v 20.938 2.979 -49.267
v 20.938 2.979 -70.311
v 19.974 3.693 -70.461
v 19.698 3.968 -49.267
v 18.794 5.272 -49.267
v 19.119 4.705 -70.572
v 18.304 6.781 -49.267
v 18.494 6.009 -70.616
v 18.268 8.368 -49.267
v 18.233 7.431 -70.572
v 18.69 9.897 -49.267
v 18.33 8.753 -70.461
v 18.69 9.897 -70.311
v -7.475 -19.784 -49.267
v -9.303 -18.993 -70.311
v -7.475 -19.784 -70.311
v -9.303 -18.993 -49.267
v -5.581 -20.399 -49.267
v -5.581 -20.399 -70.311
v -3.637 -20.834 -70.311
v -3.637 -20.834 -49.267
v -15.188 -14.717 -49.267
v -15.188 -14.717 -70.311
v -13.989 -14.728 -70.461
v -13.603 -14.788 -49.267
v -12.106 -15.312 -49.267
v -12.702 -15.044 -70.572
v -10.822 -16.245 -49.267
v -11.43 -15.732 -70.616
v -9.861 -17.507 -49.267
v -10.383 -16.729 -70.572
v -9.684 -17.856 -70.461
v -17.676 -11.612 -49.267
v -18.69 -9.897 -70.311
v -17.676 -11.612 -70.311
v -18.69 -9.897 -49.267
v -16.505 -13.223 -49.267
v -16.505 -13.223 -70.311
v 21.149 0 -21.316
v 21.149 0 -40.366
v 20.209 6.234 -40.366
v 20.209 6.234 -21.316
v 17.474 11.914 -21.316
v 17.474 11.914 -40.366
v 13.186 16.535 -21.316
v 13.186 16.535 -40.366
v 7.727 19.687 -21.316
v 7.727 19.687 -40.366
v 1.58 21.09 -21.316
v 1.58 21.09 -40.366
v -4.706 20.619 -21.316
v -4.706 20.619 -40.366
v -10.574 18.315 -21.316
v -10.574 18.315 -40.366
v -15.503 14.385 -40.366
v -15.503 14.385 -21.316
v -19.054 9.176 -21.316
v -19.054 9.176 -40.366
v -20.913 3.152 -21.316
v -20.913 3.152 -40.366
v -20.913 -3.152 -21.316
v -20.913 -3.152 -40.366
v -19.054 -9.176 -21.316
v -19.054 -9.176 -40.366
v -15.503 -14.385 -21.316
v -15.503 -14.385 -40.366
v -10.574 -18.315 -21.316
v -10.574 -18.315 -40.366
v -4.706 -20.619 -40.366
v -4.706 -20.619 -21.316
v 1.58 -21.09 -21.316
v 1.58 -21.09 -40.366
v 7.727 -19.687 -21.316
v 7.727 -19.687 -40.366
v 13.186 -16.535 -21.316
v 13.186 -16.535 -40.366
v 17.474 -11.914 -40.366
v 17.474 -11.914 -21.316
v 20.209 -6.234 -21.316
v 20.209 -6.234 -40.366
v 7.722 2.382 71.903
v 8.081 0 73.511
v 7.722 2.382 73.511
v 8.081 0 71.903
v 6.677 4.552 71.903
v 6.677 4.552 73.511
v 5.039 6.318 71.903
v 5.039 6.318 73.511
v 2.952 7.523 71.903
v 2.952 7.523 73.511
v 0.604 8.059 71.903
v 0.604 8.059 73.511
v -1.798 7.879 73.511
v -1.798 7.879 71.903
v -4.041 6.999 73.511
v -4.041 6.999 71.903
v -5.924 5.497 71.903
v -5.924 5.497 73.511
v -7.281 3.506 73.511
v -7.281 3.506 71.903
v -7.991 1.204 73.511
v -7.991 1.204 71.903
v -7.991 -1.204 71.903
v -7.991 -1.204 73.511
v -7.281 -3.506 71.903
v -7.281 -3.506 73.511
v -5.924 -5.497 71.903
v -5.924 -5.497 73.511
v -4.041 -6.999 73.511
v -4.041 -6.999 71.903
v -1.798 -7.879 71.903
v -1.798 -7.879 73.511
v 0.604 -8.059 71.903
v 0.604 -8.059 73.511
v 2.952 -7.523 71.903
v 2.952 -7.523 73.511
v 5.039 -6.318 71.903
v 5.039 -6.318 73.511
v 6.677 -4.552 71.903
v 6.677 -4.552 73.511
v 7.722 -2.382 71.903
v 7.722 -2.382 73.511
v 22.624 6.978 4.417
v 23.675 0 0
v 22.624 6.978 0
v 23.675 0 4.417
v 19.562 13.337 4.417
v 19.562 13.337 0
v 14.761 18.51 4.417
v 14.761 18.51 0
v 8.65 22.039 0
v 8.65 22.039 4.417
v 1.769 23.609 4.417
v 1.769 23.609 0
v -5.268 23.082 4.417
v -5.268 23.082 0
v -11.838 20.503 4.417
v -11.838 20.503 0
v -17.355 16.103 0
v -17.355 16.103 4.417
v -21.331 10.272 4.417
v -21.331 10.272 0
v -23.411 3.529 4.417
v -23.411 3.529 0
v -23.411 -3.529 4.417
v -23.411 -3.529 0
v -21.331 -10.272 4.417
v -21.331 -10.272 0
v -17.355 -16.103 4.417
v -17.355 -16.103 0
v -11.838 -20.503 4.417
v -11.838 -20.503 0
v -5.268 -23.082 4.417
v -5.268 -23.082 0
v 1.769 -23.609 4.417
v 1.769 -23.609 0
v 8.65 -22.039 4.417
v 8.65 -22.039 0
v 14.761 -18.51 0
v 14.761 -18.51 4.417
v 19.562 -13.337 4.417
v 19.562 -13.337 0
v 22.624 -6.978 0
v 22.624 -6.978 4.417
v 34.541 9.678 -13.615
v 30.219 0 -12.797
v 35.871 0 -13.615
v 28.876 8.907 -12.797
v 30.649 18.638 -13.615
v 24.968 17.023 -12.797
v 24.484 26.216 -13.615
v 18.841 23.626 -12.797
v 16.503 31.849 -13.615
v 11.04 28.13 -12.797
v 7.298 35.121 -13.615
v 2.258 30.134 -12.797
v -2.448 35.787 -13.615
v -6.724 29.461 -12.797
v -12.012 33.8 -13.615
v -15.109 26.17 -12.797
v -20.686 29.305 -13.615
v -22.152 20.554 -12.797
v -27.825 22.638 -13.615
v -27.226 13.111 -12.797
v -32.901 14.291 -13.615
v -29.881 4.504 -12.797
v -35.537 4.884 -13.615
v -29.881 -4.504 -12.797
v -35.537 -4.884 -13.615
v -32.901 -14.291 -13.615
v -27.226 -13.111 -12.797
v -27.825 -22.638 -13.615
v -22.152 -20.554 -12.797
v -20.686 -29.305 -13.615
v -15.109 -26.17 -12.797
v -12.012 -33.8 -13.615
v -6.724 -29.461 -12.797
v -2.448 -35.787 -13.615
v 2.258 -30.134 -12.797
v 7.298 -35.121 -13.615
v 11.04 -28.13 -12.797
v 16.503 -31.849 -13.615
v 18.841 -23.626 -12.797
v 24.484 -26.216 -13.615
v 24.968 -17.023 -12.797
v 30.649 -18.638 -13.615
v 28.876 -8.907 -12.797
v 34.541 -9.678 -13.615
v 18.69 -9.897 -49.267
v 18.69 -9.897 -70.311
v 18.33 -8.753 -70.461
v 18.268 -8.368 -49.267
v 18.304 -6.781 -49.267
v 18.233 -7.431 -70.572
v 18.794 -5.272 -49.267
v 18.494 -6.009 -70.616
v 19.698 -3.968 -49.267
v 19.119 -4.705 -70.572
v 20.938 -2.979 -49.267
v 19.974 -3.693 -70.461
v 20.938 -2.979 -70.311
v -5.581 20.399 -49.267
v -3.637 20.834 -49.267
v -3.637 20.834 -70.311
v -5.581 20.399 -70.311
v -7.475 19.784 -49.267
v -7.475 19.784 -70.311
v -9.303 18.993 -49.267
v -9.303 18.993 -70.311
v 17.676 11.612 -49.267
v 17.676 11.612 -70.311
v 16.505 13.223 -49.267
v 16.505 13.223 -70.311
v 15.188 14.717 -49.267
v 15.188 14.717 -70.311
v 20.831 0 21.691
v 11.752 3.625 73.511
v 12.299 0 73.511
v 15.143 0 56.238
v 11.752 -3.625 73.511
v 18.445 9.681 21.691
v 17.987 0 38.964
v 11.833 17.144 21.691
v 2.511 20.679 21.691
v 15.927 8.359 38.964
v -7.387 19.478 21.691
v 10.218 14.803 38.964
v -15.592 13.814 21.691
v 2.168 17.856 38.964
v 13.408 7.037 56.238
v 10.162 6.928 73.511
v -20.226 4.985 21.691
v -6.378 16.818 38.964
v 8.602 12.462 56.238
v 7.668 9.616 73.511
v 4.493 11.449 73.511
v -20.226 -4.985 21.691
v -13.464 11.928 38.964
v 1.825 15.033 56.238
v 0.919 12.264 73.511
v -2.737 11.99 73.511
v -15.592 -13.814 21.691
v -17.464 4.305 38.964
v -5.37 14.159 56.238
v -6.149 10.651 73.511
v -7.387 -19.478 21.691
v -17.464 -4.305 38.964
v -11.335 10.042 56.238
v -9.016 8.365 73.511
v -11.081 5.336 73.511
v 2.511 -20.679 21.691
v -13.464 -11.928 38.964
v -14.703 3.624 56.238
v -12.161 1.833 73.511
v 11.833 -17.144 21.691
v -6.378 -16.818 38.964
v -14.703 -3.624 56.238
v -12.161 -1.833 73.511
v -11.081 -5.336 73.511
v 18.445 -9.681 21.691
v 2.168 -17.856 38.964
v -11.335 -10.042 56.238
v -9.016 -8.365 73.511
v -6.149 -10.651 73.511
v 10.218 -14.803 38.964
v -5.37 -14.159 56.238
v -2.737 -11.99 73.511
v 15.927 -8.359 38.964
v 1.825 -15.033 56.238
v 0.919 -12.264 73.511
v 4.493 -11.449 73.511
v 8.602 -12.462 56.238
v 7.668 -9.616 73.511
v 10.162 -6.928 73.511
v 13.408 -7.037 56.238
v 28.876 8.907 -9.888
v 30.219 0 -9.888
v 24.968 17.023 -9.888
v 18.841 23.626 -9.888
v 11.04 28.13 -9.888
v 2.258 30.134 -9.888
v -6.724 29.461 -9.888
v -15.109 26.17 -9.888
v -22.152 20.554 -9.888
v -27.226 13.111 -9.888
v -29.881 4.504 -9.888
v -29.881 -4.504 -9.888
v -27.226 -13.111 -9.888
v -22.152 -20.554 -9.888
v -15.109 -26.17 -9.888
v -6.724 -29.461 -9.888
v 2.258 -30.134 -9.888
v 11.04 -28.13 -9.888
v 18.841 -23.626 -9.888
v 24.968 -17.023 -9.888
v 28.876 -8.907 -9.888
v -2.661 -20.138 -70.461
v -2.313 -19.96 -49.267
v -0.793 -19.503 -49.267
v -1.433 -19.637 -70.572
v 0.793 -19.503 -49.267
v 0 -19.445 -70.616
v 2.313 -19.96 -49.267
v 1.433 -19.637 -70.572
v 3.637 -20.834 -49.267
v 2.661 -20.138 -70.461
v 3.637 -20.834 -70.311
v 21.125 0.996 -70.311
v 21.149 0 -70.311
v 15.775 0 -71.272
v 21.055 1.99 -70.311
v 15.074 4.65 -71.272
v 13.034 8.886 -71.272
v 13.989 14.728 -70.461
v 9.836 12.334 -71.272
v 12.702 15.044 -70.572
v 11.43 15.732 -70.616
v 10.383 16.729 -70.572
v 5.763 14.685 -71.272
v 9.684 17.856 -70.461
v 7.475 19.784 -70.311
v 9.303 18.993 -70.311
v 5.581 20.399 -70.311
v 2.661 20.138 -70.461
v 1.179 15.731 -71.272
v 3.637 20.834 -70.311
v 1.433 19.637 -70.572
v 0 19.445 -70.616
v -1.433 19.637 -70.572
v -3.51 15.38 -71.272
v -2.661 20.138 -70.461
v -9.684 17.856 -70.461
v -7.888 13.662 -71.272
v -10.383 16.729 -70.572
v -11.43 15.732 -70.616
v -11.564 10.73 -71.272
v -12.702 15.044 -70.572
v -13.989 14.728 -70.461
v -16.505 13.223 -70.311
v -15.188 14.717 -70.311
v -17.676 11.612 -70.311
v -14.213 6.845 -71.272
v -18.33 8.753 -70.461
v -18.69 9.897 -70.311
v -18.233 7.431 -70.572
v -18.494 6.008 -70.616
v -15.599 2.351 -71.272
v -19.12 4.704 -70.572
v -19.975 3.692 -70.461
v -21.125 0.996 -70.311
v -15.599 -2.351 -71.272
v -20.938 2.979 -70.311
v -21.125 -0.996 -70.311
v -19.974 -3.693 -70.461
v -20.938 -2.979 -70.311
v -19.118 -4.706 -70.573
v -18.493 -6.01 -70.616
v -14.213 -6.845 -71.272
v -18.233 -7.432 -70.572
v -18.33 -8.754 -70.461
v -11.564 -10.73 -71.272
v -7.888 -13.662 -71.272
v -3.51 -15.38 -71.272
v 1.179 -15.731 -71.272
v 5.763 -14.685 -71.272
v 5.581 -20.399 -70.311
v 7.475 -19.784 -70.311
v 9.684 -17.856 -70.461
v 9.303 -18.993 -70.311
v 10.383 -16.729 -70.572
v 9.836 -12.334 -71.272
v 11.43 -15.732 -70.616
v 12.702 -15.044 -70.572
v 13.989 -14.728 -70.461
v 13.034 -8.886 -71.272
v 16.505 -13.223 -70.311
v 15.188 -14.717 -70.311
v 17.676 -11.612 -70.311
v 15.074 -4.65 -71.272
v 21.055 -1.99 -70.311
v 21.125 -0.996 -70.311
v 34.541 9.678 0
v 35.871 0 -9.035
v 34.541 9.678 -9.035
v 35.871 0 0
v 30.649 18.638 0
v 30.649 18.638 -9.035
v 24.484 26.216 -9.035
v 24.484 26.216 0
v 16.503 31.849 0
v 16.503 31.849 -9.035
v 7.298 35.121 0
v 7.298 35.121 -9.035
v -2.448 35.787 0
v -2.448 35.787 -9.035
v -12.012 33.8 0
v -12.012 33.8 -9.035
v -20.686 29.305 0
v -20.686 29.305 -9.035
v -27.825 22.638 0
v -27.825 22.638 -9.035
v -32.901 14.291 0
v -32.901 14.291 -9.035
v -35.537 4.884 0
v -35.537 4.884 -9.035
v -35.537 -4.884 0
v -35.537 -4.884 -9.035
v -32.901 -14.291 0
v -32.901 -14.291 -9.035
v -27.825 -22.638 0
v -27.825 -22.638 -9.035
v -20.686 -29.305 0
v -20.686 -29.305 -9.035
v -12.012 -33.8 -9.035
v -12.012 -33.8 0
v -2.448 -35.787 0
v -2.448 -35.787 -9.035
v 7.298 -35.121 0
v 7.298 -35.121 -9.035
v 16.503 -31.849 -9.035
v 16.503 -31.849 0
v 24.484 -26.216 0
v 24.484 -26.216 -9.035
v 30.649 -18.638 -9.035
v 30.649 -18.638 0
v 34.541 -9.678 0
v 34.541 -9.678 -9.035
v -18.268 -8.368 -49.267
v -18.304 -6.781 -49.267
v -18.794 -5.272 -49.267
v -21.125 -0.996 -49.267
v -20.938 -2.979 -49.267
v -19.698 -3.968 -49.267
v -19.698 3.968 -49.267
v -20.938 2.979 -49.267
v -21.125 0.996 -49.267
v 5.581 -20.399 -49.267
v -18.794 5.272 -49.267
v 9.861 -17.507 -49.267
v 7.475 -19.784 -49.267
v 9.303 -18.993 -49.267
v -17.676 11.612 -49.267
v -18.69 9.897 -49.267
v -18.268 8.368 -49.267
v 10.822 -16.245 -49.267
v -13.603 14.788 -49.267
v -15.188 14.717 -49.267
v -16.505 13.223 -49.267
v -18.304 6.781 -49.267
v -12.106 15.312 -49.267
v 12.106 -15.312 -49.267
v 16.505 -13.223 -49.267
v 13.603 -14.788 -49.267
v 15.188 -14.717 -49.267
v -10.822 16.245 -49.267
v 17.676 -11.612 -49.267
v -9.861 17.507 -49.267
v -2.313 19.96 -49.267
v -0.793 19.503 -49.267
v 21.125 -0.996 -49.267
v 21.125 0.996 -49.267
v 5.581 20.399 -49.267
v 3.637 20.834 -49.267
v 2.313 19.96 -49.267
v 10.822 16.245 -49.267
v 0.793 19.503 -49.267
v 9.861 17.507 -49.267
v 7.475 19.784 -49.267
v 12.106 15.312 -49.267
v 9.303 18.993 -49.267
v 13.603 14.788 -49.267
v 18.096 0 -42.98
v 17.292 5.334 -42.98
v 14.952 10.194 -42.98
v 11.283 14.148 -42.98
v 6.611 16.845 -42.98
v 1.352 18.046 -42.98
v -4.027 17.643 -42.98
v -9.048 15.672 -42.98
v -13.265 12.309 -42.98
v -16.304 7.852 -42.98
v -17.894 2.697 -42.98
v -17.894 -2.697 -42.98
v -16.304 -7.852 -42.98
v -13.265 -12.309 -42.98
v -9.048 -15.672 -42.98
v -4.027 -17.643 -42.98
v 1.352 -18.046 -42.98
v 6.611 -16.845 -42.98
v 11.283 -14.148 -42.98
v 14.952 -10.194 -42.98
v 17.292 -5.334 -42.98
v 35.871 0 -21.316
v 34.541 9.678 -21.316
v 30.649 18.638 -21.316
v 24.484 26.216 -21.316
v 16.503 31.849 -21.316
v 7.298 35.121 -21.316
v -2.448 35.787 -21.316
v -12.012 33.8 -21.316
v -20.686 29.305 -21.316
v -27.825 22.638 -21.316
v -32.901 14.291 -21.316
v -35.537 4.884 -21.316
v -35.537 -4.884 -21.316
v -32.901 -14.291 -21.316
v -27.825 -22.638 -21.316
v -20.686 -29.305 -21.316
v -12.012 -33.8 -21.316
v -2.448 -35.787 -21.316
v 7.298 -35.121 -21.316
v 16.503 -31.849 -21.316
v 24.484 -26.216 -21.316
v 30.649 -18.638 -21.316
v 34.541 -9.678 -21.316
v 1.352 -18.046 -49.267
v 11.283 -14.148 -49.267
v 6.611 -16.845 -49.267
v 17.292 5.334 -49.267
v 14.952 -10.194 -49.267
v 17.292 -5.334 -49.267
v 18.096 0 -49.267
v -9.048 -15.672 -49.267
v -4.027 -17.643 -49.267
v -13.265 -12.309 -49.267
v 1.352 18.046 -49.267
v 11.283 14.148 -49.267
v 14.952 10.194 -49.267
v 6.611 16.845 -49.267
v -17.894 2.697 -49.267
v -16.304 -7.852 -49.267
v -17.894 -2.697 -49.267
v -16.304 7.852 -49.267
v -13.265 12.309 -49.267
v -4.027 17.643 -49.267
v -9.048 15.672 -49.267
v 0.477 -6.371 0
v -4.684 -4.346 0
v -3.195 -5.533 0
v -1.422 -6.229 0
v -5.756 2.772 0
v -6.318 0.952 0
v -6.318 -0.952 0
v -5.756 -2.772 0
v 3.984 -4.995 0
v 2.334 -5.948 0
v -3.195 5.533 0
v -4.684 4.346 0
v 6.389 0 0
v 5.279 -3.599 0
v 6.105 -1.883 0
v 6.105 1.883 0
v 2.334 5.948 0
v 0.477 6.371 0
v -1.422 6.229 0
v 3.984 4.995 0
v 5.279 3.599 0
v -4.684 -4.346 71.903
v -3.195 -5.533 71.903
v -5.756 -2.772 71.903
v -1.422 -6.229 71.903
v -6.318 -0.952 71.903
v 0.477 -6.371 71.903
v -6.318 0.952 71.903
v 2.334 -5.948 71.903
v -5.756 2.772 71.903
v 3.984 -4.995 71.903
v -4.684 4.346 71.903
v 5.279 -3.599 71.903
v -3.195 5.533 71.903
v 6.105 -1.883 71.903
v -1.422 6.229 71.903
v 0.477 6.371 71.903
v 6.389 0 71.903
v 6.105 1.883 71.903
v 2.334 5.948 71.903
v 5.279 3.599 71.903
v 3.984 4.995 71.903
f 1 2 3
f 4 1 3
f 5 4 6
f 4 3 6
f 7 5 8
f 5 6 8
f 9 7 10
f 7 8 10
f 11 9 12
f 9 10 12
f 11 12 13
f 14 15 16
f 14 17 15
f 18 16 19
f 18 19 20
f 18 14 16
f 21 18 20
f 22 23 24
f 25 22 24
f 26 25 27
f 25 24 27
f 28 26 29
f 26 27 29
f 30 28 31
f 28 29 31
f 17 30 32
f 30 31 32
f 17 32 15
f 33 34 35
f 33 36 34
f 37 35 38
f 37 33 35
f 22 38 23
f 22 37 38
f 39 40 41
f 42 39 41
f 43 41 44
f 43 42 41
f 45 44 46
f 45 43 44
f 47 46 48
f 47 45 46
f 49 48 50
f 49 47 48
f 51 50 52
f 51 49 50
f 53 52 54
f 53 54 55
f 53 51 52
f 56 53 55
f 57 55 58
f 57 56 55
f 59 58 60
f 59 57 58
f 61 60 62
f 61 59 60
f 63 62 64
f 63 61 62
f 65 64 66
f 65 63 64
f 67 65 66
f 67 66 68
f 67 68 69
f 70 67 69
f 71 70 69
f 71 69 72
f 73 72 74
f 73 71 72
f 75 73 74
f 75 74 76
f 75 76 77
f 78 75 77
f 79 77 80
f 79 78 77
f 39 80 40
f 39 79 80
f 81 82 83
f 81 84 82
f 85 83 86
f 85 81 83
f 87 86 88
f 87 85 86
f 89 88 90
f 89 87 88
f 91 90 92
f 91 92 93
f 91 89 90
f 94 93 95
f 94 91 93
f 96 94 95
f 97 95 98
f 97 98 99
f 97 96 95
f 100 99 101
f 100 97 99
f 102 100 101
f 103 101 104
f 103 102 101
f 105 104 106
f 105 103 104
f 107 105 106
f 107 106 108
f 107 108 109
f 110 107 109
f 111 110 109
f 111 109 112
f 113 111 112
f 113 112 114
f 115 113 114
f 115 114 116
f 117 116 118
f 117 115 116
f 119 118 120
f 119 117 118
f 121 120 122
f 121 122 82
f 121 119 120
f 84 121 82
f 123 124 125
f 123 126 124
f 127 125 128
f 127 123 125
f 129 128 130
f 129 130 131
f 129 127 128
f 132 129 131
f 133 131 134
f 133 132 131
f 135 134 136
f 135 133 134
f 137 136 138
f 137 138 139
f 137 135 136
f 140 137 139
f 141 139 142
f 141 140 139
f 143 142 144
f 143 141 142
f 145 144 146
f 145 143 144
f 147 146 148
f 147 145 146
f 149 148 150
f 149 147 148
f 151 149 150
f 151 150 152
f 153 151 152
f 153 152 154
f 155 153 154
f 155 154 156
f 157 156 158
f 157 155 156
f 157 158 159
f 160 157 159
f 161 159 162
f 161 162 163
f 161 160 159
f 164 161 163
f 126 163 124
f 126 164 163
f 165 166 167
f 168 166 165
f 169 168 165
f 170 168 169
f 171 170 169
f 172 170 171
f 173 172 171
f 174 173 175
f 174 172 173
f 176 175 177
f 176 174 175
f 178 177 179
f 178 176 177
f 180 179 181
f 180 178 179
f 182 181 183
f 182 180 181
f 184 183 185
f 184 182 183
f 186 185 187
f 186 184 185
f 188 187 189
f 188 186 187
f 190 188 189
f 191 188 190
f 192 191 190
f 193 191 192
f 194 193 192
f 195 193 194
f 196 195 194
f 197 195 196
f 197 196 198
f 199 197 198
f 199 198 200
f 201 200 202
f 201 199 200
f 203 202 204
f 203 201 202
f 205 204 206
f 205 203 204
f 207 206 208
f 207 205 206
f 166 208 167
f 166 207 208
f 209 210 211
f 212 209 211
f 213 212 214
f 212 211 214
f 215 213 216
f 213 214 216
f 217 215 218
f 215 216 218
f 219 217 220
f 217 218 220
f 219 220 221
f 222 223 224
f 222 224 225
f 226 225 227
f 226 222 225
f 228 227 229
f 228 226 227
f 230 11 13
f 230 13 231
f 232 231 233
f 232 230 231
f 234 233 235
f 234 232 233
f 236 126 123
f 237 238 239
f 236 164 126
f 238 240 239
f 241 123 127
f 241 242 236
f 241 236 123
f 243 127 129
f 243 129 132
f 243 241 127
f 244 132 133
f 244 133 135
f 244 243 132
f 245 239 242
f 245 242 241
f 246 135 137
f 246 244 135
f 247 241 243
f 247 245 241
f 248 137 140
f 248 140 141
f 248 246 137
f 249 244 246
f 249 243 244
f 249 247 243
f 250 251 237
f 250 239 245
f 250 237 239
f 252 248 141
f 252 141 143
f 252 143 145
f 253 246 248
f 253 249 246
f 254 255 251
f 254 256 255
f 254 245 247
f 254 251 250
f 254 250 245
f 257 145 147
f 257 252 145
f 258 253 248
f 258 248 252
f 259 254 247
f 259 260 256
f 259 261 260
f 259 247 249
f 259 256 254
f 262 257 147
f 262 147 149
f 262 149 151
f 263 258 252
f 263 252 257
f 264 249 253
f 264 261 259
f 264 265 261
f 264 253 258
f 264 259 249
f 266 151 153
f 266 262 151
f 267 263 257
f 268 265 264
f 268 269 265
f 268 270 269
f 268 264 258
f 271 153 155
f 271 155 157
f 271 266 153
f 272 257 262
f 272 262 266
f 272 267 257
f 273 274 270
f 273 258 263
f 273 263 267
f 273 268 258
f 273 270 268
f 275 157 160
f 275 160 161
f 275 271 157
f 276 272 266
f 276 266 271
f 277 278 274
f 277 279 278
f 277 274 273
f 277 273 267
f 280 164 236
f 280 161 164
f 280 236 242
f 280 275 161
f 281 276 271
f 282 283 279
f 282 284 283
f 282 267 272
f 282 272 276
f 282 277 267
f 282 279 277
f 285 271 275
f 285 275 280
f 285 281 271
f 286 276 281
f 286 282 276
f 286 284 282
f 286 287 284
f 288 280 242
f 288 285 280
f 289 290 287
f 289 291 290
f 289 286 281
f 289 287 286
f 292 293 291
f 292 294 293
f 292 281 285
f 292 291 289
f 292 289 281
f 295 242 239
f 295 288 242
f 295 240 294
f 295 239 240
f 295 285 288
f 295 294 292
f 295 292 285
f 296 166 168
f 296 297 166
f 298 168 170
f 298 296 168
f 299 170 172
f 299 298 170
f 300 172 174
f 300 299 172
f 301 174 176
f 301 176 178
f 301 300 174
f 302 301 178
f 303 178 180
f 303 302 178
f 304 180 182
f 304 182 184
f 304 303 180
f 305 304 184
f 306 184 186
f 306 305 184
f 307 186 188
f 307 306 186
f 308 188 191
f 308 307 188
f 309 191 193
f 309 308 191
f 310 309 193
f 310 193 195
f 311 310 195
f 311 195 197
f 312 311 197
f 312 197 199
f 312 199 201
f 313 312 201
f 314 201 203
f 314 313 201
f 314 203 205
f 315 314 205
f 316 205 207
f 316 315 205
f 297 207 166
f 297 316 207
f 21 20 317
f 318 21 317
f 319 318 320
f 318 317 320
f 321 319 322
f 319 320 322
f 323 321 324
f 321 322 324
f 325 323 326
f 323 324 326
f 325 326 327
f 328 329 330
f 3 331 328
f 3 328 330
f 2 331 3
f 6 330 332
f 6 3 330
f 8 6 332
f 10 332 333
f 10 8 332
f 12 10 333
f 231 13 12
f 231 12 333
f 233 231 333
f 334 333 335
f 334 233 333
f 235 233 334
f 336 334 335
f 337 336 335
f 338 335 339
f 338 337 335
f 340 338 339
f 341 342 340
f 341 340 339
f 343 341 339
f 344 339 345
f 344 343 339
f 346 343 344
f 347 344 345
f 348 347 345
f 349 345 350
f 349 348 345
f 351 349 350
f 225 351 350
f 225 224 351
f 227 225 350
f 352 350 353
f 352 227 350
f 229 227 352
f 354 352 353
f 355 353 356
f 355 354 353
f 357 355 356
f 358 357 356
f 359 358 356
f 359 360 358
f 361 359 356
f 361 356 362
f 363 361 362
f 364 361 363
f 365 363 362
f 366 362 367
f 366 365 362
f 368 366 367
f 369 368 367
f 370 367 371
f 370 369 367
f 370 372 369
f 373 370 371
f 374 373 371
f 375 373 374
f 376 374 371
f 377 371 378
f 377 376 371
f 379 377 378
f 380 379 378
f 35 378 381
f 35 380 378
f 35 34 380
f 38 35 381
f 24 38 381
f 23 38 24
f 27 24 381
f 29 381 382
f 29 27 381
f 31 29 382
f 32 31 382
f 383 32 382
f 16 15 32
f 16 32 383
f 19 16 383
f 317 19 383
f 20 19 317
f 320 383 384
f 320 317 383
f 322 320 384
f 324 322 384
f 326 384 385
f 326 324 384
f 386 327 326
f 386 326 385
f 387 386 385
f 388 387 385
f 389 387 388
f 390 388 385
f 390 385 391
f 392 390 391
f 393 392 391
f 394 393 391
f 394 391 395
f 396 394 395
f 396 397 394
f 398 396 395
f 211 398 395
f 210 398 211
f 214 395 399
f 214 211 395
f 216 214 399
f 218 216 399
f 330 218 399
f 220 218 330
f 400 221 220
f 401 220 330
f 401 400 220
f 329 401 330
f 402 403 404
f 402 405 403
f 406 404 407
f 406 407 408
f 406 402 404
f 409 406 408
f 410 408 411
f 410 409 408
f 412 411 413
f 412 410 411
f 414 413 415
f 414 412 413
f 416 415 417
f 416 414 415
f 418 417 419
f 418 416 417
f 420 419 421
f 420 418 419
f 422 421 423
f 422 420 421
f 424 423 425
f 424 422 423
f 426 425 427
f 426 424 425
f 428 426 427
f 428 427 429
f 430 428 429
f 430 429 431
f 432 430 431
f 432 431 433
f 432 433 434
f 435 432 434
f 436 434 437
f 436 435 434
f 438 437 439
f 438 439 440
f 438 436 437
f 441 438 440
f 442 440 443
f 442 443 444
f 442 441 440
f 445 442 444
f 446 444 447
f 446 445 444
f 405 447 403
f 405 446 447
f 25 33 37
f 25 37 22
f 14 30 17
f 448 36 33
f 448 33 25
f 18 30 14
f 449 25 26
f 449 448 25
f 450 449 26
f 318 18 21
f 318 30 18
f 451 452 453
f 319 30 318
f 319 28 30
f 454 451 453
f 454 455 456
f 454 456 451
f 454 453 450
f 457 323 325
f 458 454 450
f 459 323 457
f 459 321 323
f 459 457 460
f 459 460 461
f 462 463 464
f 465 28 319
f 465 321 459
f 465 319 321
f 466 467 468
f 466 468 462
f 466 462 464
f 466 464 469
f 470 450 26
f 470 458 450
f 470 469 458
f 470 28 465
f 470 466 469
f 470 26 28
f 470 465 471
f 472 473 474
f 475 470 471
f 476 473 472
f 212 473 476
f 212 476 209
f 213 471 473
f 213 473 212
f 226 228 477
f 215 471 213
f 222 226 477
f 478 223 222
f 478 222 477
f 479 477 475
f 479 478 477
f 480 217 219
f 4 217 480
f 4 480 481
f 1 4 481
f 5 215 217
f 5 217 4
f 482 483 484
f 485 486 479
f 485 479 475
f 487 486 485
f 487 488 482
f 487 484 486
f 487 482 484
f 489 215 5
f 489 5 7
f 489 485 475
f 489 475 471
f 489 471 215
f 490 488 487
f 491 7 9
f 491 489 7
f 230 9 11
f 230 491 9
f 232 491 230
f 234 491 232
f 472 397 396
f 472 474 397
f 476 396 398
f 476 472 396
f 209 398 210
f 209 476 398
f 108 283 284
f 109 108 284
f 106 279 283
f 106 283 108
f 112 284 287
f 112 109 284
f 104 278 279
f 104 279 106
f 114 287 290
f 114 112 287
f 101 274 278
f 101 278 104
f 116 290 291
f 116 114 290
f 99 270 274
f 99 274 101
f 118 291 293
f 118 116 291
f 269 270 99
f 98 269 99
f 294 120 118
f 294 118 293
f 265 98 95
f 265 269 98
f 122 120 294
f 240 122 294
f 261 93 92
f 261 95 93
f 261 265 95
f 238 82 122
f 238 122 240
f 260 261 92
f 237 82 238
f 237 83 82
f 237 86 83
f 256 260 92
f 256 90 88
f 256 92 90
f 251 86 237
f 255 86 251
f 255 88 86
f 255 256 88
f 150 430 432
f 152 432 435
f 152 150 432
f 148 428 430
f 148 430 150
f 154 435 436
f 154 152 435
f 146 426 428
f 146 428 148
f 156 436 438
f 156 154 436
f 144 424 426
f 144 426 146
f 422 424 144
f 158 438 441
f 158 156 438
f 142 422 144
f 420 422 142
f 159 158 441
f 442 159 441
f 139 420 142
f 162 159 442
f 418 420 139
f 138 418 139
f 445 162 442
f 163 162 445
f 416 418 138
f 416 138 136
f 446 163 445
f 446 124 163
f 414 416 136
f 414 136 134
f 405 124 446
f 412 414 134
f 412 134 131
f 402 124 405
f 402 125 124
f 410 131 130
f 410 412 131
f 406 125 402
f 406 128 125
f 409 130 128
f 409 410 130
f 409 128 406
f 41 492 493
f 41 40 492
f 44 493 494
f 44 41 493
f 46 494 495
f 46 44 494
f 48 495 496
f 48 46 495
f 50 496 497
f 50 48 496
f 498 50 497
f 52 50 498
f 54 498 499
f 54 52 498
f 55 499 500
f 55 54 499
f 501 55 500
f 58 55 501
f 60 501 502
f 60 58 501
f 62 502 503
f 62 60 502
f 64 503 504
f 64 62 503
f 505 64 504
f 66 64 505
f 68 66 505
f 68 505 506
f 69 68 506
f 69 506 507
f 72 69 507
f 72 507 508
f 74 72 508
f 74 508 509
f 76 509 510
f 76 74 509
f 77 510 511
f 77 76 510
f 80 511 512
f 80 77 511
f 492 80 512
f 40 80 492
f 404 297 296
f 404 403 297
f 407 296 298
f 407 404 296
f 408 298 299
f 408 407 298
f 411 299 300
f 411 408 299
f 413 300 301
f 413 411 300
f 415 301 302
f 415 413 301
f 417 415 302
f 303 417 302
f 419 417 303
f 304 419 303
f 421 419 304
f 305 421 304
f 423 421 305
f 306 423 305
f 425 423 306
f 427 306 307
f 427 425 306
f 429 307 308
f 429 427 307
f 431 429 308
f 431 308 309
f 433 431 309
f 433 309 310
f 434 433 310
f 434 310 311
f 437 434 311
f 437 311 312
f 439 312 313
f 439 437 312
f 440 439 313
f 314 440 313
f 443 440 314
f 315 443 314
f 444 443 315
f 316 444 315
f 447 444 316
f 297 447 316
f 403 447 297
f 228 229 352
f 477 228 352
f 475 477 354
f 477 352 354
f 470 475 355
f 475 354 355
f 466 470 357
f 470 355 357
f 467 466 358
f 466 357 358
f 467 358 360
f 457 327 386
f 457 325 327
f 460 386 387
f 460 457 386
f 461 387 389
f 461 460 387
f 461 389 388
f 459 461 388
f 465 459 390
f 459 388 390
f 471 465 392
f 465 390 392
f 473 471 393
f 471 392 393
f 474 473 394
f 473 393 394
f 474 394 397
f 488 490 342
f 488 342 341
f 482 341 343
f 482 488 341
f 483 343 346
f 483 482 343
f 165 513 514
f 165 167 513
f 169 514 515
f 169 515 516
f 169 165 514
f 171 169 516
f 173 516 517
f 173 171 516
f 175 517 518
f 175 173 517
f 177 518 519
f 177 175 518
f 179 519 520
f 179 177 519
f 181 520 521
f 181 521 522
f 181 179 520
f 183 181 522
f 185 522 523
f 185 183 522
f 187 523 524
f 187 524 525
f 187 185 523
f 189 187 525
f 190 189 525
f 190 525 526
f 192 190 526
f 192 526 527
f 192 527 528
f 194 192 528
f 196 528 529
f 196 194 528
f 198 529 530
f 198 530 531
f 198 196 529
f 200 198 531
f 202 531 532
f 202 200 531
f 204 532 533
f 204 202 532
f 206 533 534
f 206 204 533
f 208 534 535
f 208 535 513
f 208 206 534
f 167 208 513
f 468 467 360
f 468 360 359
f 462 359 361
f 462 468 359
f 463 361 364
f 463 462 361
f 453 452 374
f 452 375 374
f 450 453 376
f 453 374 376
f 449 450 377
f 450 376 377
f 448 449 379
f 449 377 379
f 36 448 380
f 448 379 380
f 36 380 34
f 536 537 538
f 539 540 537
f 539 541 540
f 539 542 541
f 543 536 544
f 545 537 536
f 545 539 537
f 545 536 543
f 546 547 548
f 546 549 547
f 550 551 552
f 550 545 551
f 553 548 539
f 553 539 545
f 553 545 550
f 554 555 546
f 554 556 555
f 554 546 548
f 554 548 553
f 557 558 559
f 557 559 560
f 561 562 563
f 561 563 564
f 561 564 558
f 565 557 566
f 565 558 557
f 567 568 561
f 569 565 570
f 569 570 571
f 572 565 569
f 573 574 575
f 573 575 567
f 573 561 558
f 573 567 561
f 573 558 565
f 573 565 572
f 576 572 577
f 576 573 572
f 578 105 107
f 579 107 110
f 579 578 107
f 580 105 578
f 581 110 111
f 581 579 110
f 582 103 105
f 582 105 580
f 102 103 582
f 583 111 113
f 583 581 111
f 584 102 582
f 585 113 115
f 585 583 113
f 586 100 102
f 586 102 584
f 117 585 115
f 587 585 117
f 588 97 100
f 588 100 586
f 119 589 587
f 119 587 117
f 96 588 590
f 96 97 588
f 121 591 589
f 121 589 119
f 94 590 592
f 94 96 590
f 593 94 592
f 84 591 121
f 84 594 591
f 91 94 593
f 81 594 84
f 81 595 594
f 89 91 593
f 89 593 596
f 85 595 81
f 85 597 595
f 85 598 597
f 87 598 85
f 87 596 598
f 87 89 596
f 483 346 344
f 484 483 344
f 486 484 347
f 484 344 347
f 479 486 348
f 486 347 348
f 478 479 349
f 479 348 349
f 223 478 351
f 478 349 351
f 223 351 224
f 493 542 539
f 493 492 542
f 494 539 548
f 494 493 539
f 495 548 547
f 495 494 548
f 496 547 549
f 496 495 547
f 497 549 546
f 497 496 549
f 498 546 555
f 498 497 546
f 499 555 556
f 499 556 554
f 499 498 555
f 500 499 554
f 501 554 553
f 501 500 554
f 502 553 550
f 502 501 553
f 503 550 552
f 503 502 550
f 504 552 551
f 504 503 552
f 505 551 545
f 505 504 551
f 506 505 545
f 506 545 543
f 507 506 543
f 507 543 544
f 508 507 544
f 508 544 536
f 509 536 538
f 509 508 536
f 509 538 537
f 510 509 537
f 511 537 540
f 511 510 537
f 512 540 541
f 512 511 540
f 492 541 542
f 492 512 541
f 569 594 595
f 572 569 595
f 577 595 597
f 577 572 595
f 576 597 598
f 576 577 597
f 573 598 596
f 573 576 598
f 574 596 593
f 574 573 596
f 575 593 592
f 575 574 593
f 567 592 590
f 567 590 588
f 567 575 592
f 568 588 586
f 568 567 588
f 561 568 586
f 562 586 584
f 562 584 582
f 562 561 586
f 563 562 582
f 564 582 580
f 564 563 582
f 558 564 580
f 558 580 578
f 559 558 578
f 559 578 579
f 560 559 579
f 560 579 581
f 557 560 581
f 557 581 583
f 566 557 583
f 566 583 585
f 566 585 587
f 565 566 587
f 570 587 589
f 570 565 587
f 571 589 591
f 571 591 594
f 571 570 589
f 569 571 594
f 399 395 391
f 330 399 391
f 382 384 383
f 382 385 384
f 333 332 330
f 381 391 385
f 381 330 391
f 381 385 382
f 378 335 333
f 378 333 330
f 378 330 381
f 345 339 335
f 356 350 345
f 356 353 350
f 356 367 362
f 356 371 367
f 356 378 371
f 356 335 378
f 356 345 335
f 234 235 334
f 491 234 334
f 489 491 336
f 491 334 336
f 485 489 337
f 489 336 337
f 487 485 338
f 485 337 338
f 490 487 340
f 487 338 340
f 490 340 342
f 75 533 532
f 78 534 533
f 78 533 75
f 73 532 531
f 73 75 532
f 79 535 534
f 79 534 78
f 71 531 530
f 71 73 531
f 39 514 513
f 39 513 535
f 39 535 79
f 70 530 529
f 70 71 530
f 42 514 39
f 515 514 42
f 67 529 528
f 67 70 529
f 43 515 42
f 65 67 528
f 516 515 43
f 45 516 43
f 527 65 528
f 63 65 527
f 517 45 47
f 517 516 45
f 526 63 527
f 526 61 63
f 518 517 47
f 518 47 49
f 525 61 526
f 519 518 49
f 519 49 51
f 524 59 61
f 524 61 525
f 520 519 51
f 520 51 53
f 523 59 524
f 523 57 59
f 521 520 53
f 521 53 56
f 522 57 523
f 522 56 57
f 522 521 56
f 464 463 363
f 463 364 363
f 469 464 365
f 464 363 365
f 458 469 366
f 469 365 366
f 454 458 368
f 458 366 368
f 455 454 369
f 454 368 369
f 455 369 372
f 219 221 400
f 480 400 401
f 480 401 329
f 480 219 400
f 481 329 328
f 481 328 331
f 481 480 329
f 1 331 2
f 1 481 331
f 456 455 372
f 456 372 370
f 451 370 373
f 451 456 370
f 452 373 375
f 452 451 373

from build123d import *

# Parameters (mm, degrees)
F3_R     = 5.458927
F4_DEPTH = 25.4


with BuildPart() as f1:
    # F0 (on Front) → F1 (revolve)
    with BuildSketch(Plane.XZ):
        Polygon((6.389229, 71.903244), (6.389229, 0), (23.67539, 0), (23.67539, 4.417483), (12.29879, 73.511072), (8.081362, 73.511072), (8.081362, 71.903244), align=None)
        Polygon((6.389229, 0), (0, 0), (0, -49.266592), (18.096216, -49.266592), (18.096216, -42.980246), (21.148866, -40.366465), (21.148866, -21.316465), (35.870843, -21.316465), (35.870843, -13.614955), (30.21853, -12.796615), (30.21853, -9.887878), (35.870843, -9.034539), (35.870843, 0), (23.67539, 0), align=None)
    revolve(axis=Axis((0, 0, -35.6362), (0, 0, 1)))


with BuildPart() as f2:
    # F0 (on Front) → F2 (revolve)
    with BuildSketch(Plane.XZ):
        Polygon((18.096216, -49.266592), (0, -49.266592), (0, -71.2724), (15.775198, -71.2724), (21.148866, -70.311442), (21.148866, -49.266592), align=None)
    revolve(axis=Axis((0, 0, -35.6362), (0, 0, 1)))

    # F3 (on face) → F4 (cut)
    with BuildSketch(Plane(origin=(0, 0, -71.2724), x_dir=(1, 0, 0), z_dir=(0, 0, -1))):
        with Locations((0, 24.904419)):
            Circle(F3_R)
        with Locations((-14.63845, 20.148098)):
            Circle(F3_R)
        with Locations((-23.68551, 7.695889)):
            Circle(F3_R)
        with Locations((-23.68551, -7.695889)):
            Circle(F3_R)
        with Locations((-14.63845, -20.148098)):
            Circle(F3_R)
        with Locations((0, -24.904419)):
            Circle(F3_R)
        with Locations((14.63845, -20.148098)):
            Circle(F3_R)
        with Locations((23.68551, -7.695889)):
            Circle(F3_R)
        with Locations((23.68551, 7.695889)):
            Circle(F3_R)
        with Locations((14.63845, 20.148098)):
            Circle(F3_R)
    extrude(amount=-F4_DEPTH, mode=Mode.SUBTRACT)


solid = Compound([f1.part, f2.part])
